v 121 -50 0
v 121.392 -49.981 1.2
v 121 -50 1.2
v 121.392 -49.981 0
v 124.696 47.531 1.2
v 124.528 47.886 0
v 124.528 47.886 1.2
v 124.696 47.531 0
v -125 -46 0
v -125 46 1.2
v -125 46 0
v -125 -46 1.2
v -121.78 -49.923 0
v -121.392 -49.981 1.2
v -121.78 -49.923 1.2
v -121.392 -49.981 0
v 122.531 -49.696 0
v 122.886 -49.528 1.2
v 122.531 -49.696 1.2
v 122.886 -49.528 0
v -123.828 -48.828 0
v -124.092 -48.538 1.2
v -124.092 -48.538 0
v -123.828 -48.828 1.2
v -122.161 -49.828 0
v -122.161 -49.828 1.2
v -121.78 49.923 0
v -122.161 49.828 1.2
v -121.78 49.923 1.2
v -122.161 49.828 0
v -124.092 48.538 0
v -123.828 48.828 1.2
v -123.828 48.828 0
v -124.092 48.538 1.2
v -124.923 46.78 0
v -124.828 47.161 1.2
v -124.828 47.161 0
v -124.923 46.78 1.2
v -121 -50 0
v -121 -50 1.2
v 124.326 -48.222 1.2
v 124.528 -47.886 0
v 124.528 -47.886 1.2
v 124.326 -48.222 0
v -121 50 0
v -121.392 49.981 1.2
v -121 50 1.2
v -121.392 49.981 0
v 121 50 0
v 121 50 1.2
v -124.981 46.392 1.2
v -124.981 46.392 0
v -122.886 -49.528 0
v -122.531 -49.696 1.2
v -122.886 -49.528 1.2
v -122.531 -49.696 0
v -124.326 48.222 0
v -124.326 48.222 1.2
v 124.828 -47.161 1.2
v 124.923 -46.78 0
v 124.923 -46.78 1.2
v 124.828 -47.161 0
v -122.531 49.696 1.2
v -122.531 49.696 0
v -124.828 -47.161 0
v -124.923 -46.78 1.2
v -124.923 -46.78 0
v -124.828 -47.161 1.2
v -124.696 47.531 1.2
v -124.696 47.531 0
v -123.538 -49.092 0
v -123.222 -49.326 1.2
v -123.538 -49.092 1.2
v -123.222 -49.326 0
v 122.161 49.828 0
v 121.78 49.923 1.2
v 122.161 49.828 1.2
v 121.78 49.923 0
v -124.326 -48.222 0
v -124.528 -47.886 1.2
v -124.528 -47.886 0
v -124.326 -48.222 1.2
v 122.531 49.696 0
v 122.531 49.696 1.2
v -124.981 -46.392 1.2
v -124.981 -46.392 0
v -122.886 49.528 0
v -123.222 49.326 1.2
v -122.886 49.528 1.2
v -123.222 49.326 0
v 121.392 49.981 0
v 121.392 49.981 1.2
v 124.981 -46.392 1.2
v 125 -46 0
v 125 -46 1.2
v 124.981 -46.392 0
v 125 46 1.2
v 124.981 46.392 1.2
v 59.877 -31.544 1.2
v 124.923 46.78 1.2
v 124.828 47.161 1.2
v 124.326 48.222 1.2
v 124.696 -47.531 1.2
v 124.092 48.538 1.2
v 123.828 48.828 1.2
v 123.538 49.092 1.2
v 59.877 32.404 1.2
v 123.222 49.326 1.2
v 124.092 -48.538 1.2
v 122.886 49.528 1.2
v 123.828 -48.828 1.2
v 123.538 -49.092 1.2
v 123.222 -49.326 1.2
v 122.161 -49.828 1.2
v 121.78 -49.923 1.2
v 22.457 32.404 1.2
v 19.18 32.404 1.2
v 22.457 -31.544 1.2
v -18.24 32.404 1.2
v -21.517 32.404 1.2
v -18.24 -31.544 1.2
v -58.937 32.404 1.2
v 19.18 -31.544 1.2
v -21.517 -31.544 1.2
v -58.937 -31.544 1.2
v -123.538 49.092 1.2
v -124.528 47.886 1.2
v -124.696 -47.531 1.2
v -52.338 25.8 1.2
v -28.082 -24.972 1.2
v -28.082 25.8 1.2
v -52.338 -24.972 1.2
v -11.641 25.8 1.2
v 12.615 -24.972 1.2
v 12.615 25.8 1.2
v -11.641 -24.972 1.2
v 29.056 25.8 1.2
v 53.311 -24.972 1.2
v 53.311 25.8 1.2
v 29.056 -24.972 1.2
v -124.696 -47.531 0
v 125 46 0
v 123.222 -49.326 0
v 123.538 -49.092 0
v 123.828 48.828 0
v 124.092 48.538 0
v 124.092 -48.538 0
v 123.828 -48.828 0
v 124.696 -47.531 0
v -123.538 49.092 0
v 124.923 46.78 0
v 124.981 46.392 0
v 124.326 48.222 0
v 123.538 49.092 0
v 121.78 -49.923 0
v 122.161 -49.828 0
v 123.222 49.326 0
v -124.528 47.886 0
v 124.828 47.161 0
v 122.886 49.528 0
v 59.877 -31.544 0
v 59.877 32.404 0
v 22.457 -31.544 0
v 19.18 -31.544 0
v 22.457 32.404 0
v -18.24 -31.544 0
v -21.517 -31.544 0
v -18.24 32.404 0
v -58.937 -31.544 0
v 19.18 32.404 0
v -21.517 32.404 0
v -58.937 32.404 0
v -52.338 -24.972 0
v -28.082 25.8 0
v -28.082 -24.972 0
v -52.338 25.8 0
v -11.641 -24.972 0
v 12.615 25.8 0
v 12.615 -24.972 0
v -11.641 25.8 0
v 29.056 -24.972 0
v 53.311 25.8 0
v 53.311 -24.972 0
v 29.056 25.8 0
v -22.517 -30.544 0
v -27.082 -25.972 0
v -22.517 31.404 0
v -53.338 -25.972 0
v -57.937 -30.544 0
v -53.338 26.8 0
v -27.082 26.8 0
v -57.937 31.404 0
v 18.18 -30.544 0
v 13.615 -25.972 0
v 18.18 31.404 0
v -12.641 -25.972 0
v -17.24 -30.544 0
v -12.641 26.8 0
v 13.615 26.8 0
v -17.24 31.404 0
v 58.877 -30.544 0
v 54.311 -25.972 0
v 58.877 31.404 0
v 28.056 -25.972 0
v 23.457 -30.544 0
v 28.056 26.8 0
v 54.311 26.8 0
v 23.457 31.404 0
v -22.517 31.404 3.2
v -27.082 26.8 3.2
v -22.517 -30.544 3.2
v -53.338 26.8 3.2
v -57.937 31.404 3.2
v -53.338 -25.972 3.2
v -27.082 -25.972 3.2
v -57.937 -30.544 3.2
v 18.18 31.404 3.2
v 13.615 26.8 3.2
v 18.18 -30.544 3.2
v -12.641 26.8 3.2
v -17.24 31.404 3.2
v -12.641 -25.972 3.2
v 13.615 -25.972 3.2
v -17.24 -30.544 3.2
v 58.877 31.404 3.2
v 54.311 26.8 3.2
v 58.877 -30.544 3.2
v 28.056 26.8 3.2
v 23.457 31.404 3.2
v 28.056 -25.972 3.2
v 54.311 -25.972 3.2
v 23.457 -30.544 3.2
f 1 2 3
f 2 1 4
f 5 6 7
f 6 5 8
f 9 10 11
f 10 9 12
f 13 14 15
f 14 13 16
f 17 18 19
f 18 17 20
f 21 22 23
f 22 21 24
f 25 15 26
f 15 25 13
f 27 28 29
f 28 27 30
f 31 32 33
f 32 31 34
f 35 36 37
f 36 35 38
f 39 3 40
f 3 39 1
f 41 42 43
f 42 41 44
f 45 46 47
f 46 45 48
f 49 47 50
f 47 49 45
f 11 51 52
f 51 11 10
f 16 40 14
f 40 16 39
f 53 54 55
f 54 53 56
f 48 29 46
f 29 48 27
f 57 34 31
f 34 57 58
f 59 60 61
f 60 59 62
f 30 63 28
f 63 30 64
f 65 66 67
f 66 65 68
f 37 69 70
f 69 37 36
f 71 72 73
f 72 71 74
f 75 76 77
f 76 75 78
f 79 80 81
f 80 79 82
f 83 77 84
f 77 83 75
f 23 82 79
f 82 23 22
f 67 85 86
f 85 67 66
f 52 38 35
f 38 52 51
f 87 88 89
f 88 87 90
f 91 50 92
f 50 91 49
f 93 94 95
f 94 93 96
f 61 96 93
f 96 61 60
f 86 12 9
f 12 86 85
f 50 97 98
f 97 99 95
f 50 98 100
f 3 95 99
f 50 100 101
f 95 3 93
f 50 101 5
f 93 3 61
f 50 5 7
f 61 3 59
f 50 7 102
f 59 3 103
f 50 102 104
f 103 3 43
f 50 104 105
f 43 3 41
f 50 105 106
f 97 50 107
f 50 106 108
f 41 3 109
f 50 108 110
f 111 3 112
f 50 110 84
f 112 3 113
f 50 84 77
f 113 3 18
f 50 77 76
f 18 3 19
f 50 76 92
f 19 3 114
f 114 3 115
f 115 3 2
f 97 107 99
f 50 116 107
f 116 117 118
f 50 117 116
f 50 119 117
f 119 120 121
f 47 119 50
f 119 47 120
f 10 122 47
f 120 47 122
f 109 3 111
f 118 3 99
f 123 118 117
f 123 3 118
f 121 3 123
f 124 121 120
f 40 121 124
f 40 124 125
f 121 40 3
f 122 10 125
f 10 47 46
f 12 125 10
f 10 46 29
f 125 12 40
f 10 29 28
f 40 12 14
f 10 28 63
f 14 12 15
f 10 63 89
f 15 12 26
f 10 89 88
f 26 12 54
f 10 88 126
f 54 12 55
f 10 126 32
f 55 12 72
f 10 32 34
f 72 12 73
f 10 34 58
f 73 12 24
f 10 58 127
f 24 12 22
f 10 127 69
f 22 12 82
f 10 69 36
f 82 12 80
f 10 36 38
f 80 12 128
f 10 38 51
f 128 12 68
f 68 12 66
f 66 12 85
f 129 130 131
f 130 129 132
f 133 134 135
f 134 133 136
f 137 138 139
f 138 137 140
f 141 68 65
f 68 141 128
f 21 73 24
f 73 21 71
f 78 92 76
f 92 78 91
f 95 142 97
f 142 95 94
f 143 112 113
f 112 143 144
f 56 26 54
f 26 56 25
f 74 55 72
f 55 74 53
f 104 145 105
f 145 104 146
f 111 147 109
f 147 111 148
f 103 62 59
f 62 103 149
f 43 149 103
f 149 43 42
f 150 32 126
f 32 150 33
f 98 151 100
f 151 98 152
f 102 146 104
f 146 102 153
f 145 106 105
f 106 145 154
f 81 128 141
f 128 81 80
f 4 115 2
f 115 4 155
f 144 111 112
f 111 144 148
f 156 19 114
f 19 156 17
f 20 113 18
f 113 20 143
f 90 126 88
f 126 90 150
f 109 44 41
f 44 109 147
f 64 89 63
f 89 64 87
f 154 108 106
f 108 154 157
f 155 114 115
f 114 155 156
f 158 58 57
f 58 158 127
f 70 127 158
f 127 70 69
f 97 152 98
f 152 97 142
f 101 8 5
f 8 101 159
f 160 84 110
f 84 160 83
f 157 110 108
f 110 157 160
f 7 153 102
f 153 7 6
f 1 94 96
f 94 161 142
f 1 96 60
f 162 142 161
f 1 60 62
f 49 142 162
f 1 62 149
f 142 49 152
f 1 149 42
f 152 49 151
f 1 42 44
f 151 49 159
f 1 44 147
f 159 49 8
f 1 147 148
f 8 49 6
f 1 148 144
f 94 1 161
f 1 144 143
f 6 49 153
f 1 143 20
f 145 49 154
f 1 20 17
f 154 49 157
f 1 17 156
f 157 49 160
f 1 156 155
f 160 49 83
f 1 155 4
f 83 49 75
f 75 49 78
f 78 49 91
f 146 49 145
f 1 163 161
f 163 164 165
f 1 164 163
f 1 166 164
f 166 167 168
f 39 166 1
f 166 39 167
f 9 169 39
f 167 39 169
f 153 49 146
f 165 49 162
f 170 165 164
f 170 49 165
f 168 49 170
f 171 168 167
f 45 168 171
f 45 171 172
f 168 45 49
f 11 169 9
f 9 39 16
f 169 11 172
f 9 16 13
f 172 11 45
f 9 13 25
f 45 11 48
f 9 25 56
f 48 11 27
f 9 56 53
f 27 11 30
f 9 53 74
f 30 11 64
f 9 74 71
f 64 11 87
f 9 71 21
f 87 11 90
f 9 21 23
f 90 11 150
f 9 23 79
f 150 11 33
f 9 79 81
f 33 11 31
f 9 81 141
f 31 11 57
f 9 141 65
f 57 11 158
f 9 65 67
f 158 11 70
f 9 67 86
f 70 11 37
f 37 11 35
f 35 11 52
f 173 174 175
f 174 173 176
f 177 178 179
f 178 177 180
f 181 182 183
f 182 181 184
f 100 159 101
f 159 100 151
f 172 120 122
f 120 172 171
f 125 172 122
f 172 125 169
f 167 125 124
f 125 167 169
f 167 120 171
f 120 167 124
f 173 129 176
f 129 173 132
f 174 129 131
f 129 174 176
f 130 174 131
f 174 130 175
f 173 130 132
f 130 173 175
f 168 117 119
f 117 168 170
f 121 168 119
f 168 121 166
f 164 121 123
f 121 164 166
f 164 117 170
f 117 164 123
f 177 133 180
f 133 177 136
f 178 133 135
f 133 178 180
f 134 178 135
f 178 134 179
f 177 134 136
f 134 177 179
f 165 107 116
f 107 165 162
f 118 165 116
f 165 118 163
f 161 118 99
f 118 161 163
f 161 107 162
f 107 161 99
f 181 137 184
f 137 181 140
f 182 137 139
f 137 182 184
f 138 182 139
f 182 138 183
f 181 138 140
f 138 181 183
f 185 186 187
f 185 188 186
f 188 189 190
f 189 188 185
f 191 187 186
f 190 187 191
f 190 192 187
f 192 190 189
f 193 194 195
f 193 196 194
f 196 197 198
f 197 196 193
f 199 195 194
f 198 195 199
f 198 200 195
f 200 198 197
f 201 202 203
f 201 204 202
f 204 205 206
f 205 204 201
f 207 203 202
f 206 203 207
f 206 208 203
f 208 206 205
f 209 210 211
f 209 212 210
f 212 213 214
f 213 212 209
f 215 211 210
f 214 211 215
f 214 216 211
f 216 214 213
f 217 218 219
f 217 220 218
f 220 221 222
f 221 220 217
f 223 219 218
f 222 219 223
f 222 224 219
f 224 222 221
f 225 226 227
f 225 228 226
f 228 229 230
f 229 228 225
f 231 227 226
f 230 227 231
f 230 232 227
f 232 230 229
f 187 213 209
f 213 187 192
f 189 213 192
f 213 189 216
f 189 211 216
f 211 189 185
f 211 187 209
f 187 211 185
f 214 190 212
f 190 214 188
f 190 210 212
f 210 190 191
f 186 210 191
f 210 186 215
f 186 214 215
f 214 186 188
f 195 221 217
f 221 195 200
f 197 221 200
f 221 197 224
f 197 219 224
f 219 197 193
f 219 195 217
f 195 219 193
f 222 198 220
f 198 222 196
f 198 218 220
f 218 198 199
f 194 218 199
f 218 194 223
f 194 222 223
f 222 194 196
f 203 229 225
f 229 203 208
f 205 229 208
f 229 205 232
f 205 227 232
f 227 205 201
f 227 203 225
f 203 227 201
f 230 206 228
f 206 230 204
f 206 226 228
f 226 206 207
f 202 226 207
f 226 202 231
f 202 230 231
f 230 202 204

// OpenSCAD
$fn = 64;

// =====================
// 全局参数（两部分共用）
// =====================
plate_w = 250;
plate_h = 100;
plate_t = 1.2;
corner_r = 4;

text_str  = "知行室";
text_size = 50;
font_name = "Heiti SC:style=Regular";

text_height = 3.2;

// 笔画连接（防止中文断裂）
stroke_join = 0.35;

// 装配间隙（阴文孔 > 阳文字）
fit_gap = 1;

// 阴阳文之间的展示间距
spacing = 160;


// =====================
// 工具模块
// =====================

// 圆角矩形
module rounded_rect(w, h, r) {
    offset(r = r)
        square([w - 2*r, h - 2*r], center = true);
}

// 文字轮廓（统一来源）
module text_shape(delta = 0) {
    offset(delta = delta)
        text(
            text_str,
            size = text_size,
            font = font_name,
            halign = "center",
            valign = "center"
        );
}


// =====================
// 阴文（底板挖空）
// =====================
module yin_plate() {
    difference() {

        // 底板
        linear_extrude(height = plate_t)
            rounded_rect(plate_w, plate_h, corner_r);

        // 挖空文字（略大，形成装配间隙）
        translate([0, 0, -0.1])
            linear_extrude(height = plate_t + 0.2)
                text_shape(delta = stroke_join + fit_gap);
    }
}


// =====================
// 阳文（嵌入字块）
// =====================
module yang_text() {
    linear_extrude(height = text_height)
        text_shape(delta = stroke_join);
}


// =====================
// 组合展示
// =====================

// 左：阴文
translate([0, 0, 0])
    yin_plate();

// 右：阳文
translate([ 0, 0, 0])
    yang_text();
